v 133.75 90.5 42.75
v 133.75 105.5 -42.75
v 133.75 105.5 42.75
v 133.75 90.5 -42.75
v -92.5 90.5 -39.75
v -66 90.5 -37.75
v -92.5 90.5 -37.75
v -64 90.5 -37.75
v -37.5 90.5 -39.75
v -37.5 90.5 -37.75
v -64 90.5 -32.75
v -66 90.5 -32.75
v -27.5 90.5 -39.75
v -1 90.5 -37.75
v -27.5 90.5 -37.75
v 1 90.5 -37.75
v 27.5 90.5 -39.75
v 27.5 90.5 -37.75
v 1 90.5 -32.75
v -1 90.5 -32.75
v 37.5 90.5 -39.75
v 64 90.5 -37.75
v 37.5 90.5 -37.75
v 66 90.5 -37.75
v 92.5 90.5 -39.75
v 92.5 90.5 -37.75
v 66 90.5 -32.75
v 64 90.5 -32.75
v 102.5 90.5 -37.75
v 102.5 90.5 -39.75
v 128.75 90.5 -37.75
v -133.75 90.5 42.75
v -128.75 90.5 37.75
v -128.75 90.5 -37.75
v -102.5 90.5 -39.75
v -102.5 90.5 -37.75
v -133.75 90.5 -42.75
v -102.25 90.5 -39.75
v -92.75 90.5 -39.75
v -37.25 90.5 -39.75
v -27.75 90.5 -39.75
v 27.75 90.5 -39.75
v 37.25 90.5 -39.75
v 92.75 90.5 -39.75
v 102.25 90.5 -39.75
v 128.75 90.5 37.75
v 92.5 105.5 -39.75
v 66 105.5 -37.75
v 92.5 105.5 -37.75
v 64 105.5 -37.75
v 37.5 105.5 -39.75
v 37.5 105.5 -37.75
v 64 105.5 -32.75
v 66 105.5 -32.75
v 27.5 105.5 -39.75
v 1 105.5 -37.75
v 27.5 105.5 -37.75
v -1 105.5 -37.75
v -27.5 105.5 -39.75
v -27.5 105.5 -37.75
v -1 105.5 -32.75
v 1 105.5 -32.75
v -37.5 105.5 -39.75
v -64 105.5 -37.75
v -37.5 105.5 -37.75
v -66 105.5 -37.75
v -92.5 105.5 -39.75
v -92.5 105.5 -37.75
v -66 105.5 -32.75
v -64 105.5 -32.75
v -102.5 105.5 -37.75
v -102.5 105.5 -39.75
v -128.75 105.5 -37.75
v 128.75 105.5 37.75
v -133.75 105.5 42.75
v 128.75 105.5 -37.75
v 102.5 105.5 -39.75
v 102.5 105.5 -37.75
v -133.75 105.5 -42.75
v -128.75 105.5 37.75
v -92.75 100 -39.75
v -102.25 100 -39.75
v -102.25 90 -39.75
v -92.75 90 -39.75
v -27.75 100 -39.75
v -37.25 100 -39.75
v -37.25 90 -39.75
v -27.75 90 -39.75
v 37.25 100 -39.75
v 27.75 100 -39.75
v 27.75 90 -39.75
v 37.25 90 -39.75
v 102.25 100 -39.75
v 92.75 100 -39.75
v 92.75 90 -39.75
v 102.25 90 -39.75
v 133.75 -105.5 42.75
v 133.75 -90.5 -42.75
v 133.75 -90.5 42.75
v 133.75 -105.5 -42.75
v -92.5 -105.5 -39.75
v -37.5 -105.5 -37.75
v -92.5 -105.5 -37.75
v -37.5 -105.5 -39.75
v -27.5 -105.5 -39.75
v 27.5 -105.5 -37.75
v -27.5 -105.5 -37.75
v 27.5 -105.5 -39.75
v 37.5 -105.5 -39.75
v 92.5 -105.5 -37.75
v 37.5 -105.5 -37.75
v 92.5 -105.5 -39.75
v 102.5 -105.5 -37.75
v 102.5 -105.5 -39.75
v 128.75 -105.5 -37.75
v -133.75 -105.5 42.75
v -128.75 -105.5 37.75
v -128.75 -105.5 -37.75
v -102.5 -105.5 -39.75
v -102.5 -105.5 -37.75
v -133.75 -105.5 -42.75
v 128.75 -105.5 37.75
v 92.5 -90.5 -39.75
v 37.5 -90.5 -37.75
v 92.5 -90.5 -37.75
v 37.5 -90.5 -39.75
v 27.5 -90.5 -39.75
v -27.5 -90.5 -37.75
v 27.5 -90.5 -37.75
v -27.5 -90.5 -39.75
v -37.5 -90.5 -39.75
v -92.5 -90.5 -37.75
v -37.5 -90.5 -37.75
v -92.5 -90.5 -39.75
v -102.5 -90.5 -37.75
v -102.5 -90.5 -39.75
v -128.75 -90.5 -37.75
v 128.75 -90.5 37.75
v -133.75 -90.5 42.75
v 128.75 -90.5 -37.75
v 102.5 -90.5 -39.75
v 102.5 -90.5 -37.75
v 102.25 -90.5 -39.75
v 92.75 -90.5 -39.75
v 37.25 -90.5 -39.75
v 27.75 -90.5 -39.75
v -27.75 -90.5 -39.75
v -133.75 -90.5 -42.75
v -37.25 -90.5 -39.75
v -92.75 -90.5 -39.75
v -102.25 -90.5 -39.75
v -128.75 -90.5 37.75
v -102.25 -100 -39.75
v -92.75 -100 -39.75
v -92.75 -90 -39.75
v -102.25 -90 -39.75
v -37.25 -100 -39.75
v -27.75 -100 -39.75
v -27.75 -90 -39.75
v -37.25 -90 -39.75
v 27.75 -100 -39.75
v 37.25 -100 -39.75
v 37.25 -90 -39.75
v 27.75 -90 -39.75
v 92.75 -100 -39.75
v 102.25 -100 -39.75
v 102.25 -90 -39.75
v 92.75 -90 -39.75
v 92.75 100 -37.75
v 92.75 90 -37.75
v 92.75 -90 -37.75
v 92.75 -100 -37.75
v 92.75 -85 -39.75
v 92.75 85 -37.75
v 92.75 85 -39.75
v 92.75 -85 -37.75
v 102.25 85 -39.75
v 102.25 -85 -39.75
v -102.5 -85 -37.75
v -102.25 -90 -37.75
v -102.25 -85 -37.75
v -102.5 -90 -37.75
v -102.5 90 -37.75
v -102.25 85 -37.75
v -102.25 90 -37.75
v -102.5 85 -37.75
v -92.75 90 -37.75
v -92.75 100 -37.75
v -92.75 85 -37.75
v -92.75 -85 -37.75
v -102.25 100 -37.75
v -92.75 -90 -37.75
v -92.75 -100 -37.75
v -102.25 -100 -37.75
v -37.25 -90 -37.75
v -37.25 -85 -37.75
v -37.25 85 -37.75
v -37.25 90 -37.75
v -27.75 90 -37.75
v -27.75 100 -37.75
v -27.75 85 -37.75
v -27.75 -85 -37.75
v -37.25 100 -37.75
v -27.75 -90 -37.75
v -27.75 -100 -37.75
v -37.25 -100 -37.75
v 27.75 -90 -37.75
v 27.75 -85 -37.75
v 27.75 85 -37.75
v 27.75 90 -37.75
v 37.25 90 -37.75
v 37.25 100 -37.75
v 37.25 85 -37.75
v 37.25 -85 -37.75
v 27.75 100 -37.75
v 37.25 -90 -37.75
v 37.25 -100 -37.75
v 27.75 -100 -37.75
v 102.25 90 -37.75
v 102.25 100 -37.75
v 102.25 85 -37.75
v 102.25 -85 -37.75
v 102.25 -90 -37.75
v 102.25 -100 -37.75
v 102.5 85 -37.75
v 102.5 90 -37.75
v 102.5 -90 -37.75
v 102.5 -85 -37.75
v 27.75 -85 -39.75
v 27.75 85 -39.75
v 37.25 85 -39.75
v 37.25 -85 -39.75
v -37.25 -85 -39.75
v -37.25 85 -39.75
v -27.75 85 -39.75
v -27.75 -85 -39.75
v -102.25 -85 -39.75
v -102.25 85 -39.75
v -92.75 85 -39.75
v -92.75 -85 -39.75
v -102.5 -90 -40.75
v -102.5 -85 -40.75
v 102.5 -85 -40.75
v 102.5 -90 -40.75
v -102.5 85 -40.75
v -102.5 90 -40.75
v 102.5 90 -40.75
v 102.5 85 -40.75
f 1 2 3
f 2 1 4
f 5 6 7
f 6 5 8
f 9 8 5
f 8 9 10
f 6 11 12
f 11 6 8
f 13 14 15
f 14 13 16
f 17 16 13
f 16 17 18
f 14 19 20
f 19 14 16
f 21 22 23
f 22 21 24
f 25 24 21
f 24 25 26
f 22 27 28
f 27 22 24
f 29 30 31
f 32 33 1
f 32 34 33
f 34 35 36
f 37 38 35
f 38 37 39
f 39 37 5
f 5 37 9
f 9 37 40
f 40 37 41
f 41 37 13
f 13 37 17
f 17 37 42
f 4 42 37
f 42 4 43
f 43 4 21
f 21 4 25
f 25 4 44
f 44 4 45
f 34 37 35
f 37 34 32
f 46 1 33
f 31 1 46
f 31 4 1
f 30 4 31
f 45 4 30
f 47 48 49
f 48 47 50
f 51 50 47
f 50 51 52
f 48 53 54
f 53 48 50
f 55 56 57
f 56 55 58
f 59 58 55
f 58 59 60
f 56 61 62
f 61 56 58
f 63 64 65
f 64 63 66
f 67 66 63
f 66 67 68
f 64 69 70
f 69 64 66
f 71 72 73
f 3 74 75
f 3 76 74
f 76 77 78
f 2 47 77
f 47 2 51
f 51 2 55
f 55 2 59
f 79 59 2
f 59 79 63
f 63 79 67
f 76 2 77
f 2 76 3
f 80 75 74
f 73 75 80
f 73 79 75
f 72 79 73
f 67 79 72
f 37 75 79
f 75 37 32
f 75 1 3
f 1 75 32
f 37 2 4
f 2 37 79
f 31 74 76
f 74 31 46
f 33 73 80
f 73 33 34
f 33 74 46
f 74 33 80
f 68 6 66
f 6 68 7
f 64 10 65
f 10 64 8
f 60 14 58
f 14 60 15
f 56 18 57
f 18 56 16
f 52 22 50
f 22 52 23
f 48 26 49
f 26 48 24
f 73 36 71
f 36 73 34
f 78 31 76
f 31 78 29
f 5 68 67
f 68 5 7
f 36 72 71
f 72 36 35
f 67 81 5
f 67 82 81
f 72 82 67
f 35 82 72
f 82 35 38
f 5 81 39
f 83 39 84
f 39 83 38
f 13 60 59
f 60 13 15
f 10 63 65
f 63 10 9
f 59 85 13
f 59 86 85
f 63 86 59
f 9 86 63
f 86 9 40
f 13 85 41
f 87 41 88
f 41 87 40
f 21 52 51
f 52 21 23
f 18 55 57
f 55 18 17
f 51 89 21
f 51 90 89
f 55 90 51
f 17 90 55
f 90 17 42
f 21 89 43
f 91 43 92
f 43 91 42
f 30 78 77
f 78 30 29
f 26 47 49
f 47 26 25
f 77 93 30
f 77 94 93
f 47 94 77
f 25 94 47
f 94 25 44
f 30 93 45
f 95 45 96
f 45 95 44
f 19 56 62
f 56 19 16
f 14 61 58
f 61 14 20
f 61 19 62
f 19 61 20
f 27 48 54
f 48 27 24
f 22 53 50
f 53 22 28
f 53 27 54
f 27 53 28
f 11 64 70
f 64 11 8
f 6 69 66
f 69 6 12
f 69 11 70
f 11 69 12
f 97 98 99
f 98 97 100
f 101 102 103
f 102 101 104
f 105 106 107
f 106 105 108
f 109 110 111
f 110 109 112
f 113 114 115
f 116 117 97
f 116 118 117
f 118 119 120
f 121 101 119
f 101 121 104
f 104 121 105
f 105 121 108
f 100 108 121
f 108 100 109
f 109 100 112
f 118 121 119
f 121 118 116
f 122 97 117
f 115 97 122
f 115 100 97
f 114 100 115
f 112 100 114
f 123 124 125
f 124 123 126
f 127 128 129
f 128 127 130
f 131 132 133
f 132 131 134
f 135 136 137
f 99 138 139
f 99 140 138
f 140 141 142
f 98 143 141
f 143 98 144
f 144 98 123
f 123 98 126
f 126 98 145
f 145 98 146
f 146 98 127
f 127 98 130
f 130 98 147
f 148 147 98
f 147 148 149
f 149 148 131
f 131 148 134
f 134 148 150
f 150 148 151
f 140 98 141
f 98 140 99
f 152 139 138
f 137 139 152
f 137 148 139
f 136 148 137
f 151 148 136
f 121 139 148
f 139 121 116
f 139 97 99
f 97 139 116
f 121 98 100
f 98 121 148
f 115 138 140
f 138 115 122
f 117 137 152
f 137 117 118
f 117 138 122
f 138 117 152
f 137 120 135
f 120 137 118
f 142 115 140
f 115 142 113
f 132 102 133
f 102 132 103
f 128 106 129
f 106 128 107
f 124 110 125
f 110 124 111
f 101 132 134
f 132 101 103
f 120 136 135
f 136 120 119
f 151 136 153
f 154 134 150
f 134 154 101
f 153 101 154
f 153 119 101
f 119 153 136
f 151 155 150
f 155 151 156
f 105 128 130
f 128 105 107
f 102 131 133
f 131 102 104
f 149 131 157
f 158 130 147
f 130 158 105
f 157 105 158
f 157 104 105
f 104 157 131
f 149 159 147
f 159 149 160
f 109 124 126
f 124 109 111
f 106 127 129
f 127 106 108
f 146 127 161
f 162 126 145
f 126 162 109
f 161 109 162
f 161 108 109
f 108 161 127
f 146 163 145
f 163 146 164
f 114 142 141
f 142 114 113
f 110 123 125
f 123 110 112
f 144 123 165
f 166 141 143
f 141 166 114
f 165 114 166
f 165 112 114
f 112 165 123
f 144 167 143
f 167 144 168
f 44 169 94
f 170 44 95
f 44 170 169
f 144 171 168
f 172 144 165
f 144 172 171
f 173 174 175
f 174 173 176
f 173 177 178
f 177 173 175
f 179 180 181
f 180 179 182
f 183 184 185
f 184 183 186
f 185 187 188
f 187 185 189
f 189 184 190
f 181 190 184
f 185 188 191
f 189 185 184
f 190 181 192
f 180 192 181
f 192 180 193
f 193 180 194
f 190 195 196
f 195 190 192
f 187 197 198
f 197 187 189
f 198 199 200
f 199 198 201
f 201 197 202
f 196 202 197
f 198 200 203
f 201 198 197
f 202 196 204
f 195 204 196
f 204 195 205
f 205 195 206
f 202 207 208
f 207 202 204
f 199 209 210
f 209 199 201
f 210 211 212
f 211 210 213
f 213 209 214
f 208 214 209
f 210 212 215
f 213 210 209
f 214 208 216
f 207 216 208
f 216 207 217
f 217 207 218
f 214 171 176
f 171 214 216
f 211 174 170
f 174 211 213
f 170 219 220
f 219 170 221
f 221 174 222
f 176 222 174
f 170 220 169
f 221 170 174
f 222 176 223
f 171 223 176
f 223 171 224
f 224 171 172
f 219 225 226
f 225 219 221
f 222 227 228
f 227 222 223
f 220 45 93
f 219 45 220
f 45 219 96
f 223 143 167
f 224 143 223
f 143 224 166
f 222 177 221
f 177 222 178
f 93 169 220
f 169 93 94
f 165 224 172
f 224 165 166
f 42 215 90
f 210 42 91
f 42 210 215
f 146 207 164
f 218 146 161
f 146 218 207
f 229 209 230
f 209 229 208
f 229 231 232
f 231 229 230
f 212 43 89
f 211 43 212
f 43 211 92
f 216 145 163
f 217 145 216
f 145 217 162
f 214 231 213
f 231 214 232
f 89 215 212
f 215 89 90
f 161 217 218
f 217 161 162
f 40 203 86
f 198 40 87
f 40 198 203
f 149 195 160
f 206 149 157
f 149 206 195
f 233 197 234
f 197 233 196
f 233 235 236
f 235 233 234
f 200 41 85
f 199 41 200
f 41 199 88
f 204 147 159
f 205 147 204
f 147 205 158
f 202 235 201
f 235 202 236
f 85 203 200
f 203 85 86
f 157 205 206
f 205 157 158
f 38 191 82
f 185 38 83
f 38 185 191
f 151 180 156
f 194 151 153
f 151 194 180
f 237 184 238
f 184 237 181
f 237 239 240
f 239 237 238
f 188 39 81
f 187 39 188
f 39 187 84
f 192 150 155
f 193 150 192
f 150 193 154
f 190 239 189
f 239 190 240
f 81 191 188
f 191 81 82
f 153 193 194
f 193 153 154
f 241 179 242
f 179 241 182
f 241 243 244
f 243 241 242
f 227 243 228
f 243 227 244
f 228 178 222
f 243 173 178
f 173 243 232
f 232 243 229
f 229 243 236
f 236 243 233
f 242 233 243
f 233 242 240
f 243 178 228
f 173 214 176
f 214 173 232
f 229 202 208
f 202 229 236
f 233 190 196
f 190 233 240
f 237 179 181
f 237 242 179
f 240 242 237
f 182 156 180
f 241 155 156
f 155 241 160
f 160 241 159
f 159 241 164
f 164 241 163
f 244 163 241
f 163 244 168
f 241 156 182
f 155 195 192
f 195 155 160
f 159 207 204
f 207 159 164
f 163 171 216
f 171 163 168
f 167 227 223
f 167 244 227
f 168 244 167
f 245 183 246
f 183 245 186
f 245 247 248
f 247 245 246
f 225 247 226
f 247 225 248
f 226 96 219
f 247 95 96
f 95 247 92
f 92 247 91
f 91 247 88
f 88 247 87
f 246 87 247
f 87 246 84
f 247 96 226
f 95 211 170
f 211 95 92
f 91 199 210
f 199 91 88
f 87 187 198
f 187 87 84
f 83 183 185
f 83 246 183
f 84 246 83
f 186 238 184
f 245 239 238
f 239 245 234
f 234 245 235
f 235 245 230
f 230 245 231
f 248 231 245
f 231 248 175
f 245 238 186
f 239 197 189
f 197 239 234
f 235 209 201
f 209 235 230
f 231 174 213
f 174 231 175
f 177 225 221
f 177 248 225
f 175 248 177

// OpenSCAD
boxX = 62.5;
boxY = 65.5;
boxZ = 280;

slotCount = 4;
slotSeparator = 2.5;
slotSeparatorX = slotSeparator - 0.5;
slotSeparatorY = 5;

innerX = (boxX * slotCount) + (slotSeparator * (slotCount - 1));
innerY = boxY + 10;

z = 15;

outerX = innerX + 10;
outerY = innerY + 10;

module rearFrame() {

    difference() {
        cube([outerX, outerY, z], center = true);
        cube([innerX, innerY, z], center = true);
        translate([(boxX / 2) - (innerX / 2), -innerY / 2, 0]) cube([10, 4, z], center = true);
        translate([- (boxX / 2) - (slotSeparator / 2), -innerY / 2, 0]) cube([10, 4, z], center = true);
        translate([(boxX / 2) + (slotSeparator / 2), -innerY / 2, 0]) cube([10, 4, z], center = true);
        translate([(innerX / 2) - (boxX / 2), -innerY / 2, 0]) cube([10, 4, z], center = true);
    };

};

module frontFrame() {

    difference() {
        cube([outerX, outerY, z], center = true);
        cube([innerX, innerY, z], center = true);
        translate([(boxX / 2) - (innerX / 2), -innerY / 2, 0]) cube([10, 4, z], center = true);
        translate([- (boxX / 2) - (slotSeparator / 2), -innerY / 2, 0]) cube([10, 4, z], center = true);
        translate([(boxX / 2) + (slotSeparator / 2), -innerY / 2, 0]) cube([10, 4, z], center = true);
        translate([(innerX / 2) - (boxX / 2), -innerY / 2, 0]) cube([10, 4, z], center = true);
    };

    translate([0, -(innerY - slotSeparatorY) / 2, 0]) cube([slotSeparatorX, slotSeparatorY, z], center = true);
    translate([boxX + slotSeparator, -(innerY - slotSeparatorY) / 2, 0]) cube([slotSeparatorX, slotSeparatorY, z], center = true);
    translate([-(boxX + slotSeparator), -(innerY - slotSeparatorY) / 2, 0]) cube([slotSeparatorX, slotSeparatorY, z], center = true);

};

module bottomFrame() {

    cube([9.5, 200, 2], center = true);
    translate([boxX + slotSeparator, 0, 0]) cube([9.5, 200, 2], center = true);
    translate([(boxX + slotSeparator) * 2, 0, 0]) cube([9.5, 200, 2], center = true);
    translate([(boxX + slotSeparator) * 3, 0, 0]) cube([9.5, 200, 2], center = true);

    translate([((boxX + slotSeparator) * 3) / 2, -87.5, 0.5]) cube([ 10 + (boxX + slotSeparator) * 3, 5, 3], center = true);
    translate([((boxX + slotSeparator) * 3) / 2, 87.5, 0.5]) cube([ 10 + (boxX + slotSeparator) * 3, 5, 3], center = true);

};

translate([0, 98, 0]) rotate([90, 0, 0]) frontFrame();
translate([0, -98, 0]) rotate([90, 0, 0]) rearFrame();
translate([97.5, 0, -38.75]) rotate([0, 180, 0]) bottomFrame();
